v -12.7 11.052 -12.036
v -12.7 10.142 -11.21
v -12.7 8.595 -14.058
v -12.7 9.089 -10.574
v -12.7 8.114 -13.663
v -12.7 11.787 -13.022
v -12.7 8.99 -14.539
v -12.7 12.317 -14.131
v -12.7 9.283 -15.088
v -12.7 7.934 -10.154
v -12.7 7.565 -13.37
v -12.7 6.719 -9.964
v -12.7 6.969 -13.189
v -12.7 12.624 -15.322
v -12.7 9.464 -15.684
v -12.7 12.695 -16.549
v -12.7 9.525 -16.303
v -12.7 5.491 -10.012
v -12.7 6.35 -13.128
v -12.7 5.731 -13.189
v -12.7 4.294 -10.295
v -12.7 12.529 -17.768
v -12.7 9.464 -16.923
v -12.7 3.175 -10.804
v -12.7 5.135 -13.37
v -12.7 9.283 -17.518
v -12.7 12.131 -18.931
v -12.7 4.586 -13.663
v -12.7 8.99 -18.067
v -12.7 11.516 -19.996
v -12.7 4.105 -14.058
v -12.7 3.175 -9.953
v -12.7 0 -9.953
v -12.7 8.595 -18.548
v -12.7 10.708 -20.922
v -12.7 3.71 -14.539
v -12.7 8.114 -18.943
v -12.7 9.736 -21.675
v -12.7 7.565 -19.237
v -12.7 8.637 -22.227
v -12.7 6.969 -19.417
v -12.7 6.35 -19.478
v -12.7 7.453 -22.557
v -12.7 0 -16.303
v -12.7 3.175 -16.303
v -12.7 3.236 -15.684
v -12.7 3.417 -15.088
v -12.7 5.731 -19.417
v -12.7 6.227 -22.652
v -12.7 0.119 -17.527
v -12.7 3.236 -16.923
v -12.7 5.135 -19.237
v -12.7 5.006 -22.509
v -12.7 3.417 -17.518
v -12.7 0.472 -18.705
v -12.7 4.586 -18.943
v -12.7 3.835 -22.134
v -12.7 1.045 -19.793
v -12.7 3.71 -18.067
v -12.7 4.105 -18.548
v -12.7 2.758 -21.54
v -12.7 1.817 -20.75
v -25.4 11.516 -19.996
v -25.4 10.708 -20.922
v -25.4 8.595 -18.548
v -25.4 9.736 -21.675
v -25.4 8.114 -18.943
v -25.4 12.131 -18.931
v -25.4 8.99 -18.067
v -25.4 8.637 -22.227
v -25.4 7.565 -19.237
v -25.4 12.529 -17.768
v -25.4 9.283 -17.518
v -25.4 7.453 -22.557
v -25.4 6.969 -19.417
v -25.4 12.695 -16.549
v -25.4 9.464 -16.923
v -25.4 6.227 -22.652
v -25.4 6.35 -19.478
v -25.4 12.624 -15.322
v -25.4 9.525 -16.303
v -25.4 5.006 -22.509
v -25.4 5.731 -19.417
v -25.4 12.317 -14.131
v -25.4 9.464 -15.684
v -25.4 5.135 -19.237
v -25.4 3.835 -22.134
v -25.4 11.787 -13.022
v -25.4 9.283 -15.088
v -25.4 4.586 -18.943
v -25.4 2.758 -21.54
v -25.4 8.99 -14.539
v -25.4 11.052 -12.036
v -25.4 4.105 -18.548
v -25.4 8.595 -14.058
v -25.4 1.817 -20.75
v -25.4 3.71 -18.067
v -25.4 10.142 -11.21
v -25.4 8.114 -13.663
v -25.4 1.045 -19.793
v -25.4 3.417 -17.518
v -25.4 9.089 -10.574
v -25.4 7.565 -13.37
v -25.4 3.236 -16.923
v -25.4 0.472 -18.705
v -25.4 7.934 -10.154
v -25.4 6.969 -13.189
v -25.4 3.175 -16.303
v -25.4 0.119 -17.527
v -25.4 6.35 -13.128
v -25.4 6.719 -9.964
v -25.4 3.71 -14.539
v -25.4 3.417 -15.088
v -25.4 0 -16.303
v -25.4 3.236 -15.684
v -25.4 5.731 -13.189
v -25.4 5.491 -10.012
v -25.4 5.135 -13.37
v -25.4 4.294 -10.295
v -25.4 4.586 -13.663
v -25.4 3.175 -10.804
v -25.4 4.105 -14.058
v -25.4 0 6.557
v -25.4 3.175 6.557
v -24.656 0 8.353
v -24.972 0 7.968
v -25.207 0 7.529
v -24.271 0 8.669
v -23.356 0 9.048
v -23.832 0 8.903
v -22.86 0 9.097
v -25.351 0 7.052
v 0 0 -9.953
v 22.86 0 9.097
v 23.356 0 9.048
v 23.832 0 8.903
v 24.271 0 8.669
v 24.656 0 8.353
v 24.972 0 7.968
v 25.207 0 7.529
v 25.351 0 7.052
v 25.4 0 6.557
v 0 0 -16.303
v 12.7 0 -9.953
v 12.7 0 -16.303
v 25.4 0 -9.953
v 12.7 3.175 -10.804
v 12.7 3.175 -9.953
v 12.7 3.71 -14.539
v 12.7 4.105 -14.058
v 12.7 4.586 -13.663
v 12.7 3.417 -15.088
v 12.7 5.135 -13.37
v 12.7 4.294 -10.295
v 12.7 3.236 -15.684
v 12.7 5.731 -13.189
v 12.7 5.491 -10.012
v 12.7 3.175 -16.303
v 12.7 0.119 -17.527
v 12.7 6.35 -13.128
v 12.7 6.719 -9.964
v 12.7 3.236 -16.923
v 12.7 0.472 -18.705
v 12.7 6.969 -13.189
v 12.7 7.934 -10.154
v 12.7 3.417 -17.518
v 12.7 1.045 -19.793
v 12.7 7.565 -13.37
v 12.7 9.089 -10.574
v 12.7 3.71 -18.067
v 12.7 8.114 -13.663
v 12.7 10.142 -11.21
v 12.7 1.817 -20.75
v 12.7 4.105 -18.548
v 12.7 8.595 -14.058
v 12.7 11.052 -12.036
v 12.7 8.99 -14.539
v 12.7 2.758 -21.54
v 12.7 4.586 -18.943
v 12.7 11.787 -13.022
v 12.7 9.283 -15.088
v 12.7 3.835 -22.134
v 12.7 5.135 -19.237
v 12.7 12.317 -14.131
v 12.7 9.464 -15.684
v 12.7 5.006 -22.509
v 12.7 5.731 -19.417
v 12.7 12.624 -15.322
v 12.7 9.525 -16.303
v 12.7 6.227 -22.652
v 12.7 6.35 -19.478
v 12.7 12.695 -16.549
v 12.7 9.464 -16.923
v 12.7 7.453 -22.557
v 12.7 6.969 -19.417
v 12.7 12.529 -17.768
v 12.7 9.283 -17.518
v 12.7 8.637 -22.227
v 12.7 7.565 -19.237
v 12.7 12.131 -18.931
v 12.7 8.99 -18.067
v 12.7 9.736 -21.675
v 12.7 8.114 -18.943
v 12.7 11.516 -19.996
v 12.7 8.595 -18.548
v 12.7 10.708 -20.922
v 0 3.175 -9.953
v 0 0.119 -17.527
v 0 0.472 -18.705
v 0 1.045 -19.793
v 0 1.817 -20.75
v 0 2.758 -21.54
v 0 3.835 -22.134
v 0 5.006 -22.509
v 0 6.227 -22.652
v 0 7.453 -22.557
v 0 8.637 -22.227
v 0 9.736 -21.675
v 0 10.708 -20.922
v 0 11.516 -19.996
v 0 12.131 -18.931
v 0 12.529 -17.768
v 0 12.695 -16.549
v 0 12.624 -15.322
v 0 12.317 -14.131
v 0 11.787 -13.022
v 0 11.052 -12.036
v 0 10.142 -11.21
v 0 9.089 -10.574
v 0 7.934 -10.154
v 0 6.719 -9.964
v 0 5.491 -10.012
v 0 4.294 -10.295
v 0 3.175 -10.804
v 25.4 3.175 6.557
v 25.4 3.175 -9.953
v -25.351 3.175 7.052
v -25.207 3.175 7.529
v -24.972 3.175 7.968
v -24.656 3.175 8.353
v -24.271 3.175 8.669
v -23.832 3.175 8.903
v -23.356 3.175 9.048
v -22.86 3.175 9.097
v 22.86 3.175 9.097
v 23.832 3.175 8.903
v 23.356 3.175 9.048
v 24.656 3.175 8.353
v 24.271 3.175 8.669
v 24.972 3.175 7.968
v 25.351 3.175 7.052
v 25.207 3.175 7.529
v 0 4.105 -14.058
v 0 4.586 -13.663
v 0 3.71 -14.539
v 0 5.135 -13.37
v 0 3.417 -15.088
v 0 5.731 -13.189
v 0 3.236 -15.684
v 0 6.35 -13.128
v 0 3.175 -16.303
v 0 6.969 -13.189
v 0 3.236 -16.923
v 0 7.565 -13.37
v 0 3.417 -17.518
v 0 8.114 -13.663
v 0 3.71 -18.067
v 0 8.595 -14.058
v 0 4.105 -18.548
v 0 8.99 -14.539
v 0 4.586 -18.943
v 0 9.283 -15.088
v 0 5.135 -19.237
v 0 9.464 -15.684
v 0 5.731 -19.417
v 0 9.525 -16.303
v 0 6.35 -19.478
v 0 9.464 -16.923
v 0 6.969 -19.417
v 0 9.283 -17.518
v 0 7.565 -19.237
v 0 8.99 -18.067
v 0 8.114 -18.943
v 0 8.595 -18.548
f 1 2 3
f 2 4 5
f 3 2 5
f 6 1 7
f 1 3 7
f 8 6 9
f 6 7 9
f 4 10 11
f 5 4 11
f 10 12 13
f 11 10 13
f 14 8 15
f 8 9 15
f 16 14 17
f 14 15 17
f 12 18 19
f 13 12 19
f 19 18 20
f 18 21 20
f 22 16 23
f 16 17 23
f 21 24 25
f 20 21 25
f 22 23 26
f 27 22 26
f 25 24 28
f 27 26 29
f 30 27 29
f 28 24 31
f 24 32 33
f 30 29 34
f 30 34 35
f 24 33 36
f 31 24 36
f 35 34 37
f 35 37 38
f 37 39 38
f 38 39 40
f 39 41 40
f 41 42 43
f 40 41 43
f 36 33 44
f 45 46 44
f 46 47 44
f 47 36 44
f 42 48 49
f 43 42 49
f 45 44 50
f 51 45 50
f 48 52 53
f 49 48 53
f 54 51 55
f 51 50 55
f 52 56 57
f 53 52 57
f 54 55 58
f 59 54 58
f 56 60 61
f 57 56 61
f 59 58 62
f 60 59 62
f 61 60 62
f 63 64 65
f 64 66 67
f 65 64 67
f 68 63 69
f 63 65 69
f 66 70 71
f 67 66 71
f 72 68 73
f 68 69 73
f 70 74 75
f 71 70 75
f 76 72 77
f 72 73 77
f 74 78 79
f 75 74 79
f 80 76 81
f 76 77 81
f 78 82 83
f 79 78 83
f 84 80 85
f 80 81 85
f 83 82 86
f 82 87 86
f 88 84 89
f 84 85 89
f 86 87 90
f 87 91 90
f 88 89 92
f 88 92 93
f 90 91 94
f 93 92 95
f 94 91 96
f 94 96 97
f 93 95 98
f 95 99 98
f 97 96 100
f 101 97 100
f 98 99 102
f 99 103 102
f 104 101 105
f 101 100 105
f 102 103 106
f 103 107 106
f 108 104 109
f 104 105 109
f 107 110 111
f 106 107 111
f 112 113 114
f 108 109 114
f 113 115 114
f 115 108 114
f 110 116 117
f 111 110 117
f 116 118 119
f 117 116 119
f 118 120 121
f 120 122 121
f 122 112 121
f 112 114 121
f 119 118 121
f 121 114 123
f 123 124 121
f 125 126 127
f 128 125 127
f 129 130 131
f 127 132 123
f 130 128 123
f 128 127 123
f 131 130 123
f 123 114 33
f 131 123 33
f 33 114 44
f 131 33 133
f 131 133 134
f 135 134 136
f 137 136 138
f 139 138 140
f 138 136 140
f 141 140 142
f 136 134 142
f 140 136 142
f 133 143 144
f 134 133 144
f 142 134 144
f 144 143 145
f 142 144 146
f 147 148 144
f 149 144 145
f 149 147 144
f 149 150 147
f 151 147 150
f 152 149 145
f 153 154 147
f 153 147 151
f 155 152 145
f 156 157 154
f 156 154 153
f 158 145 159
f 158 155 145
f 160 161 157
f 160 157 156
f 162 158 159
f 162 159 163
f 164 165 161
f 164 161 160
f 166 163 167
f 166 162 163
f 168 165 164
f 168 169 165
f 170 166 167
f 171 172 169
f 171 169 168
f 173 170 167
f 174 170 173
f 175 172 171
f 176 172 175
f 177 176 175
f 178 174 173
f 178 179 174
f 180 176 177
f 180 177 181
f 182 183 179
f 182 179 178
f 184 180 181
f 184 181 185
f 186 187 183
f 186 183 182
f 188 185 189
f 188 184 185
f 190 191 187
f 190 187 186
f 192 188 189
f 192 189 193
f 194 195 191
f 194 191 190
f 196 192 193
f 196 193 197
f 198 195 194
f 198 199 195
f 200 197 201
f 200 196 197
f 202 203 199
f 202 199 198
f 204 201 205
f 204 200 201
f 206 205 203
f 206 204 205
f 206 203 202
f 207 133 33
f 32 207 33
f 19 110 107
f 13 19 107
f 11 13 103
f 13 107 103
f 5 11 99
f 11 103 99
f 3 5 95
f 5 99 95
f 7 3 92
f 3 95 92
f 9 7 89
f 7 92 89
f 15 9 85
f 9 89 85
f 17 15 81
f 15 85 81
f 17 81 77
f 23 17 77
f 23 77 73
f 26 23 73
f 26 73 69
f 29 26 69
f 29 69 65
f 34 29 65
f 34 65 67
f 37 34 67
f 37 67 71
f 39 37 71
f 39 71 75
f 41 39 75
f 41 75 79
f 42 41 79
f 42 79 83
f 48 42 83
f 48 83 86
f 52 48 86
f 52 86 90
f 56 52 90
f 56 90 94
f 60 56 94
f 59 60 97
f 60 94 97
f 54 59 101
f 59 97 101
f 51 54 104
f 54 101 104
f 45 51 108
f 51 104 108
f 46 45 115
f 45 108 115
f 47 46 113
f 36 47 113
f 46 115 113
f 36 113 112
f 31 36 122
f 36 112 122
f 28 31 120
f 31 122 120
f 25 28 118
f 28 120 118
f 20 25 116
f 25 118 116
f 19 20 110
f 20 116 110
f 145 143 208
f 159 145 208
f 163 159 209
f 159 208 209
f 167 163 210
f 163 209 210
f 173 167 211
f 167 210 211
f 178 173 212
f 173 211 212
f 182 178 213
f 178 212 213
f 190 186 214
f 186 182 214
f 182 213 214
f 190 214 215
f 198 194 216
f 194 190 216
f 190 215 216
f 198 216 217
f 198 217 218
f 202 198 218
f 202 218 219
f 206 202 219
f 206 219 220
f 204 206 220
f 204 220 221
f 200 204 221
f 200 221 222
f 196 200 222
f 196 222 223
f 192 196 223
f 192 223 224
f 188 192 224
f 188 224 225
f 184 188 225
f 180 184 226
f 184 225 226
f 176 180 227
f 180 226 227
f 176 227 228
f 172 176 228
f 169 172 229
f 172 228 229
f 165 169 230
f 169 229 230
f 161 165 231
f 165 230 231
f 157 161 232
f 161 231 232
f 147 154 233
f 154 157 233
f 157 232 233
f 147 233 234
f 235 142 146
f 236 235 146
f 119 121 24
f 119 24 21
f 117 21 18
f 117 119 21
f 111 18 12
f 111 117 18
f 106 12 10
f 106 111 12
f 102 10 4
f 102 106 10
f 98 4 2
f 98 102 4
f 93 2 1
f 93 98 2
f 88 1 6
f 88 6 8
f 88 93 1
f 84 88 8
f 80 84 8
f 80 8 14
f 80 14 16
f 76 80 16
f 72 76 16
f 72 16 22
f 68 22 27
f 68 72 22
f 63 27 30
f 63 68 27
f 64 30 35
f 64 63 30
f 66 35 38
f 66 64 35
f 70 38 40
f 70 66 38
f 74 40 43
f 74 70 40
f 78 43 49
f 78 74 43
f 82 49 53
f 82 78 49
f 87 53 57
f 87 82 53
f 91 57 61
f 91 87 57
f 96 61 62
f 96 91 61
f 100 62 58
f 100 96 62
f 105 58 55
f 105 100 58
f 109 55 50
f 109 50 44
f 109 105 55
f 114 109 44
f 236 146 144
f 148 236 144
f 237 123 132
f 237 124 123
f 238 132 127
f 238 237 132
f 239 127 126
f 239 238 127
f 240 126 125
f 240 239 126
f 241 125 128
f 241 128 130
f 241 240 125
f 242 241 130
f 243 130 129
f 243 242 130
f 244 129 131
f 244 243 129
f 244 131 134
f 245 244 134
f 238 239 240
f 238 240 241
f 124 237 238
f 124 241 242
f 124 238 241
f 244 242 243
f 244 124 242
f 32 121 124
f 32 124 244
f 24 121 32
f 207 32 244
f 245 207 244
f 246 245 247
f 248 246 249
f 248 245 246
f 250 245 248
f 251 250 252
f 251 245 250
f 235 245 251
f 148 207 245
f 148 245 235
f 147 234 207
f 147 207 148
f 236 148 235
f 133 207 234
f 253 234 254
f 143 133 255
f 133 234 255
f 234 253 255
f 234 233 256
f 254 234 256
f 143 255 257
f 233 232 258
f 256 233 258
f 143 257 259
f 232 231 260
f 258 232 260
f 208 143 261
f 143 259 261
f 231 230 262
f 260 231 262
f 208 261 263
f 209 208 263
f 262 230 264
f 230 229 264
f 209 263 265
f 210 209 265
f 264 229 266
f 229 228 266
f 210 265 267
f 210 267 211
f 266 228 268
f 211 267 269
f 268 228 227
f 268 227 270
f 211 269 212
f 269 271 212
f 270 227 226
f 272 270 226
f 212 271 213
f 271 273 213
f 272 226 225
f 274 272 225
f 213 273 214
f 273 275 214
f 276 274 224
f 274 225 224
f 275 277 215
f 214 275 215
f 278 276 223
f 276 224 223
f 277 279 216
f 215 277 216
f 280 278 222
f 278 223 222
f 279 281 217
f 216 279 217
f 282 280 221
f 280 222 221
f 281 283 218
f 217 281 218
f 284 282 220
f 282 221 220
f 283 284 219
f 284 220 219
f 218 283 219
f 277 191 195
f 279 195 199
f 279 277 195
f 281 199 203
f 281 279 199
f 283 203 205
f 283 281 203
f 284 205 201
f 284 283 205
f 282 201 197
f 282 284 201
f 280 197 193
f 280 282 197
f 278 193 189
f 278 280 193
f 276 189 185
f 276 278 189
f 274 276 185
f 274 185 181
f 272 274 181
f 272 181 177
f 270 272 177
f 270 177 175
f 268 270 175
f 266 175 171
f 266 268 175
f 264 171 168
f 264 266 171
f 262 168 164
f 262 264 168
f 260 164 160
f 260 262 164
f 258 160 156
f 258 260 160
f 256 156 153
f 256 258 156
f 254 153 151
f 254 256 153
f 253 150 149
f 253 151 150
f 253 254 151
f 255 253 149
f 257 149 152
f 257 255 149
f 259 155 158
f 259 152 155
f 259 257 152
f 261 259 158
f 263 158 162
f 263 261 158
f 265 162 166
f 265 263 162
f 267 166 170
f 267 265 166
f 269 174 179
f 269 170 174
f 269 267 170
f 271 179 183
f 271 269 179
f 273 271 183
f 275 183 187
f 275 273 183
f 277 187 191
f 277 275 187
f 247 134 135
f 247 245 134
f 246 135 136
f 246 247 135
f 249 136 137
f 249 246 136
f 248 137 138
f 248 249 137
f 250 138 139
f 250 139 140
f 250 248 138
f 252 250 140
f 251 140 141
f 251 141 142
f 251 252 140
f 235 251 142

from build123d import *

# Parameters (mm, degrees)
BOSS_EXTRUDE1_DEPTH = 3.175
SKETCH2_R           = 6.35
SKETCH2_R_2         = 3.175
BOSS_EXTRUDE2_DEPTH = 12.7
FILLET1_R           = 2.54
SKETCH3_R           = 3.175
BOSS_EXTRUDE3_DEPTH = 12.7


with BuildPart() as part:
    # Sketch1 → Boss-Extrude1 (new body)
    with BuildSketch(Plane(origin=(0, 0, 0), x_dir=(1, 0, 0), z_dir=(0, 1, 0))):
        Polygon((0, 9.953217651), (-12.7, 9.953217651), (-12.7, 16.303217651), (-25.4, 16.303217651), (-25.4, 9.096782349), (-25.4, -9.096782349), (25.4, -9.096782349), (25.4, 9.953217651), (12.7, 9.953217651), (12.7, 16.303217651), (0, 16.303217651), align=None)
    extrude(amount=BOSS_EXTRUDE1_DEPTH)

    # Sketch2 → Boss-Extrude2 (add)
    with BuildSketch(Plane(origin=(0, 0, 0), x_dir=(0, 0, -1), z_dir=(1, 0, 0))):
        with Locations((16.303217651, 6.35)):
            Circle(SKETCH2_R)
        with Locations((16.303217651, 6.35)):
            Circle(SKETCH2_R_2, mode=Mode.SUBTRACT)
    extrude(amount=BOSS_EXTRUDE2_DEPTH)

    # Fillet1
    fillet1_edges = [part.edges().sort_by_distance(p)[0] for p in [
        (25.4, 1.5875, 9.096782349),
        (-25.4, 1.5875, 9.096782349),
    ]]
    fillet(fillet1_edges, radius=FILLET1_R)

    # Sketch3 → Boss-Extrude3 (add)
    with BuildSketch(Plane.ZY.offset(25.4)):
        with BuildLine():
            Line((-16.303217651, 0), (-9.953217651, 0))
            Line((-9.953217651, 0), (-9.953217651, 3.175))
            Line((-9.953217651, 3.175), (-10.803956337, 3.175))
            ThreePointArc((-10.803956337, 3.175), (-19.478217651, 11.849261314), (-16.303217651, 0))
        make_face()
        with Locations((-16.303217651, 6.35)):
            Circle(SKETCH3_R, mode=Mode.SUBTRACT)
    extrude(amount=-BOSS_EXTRUDE3_DEPTH)


solid = part.part
